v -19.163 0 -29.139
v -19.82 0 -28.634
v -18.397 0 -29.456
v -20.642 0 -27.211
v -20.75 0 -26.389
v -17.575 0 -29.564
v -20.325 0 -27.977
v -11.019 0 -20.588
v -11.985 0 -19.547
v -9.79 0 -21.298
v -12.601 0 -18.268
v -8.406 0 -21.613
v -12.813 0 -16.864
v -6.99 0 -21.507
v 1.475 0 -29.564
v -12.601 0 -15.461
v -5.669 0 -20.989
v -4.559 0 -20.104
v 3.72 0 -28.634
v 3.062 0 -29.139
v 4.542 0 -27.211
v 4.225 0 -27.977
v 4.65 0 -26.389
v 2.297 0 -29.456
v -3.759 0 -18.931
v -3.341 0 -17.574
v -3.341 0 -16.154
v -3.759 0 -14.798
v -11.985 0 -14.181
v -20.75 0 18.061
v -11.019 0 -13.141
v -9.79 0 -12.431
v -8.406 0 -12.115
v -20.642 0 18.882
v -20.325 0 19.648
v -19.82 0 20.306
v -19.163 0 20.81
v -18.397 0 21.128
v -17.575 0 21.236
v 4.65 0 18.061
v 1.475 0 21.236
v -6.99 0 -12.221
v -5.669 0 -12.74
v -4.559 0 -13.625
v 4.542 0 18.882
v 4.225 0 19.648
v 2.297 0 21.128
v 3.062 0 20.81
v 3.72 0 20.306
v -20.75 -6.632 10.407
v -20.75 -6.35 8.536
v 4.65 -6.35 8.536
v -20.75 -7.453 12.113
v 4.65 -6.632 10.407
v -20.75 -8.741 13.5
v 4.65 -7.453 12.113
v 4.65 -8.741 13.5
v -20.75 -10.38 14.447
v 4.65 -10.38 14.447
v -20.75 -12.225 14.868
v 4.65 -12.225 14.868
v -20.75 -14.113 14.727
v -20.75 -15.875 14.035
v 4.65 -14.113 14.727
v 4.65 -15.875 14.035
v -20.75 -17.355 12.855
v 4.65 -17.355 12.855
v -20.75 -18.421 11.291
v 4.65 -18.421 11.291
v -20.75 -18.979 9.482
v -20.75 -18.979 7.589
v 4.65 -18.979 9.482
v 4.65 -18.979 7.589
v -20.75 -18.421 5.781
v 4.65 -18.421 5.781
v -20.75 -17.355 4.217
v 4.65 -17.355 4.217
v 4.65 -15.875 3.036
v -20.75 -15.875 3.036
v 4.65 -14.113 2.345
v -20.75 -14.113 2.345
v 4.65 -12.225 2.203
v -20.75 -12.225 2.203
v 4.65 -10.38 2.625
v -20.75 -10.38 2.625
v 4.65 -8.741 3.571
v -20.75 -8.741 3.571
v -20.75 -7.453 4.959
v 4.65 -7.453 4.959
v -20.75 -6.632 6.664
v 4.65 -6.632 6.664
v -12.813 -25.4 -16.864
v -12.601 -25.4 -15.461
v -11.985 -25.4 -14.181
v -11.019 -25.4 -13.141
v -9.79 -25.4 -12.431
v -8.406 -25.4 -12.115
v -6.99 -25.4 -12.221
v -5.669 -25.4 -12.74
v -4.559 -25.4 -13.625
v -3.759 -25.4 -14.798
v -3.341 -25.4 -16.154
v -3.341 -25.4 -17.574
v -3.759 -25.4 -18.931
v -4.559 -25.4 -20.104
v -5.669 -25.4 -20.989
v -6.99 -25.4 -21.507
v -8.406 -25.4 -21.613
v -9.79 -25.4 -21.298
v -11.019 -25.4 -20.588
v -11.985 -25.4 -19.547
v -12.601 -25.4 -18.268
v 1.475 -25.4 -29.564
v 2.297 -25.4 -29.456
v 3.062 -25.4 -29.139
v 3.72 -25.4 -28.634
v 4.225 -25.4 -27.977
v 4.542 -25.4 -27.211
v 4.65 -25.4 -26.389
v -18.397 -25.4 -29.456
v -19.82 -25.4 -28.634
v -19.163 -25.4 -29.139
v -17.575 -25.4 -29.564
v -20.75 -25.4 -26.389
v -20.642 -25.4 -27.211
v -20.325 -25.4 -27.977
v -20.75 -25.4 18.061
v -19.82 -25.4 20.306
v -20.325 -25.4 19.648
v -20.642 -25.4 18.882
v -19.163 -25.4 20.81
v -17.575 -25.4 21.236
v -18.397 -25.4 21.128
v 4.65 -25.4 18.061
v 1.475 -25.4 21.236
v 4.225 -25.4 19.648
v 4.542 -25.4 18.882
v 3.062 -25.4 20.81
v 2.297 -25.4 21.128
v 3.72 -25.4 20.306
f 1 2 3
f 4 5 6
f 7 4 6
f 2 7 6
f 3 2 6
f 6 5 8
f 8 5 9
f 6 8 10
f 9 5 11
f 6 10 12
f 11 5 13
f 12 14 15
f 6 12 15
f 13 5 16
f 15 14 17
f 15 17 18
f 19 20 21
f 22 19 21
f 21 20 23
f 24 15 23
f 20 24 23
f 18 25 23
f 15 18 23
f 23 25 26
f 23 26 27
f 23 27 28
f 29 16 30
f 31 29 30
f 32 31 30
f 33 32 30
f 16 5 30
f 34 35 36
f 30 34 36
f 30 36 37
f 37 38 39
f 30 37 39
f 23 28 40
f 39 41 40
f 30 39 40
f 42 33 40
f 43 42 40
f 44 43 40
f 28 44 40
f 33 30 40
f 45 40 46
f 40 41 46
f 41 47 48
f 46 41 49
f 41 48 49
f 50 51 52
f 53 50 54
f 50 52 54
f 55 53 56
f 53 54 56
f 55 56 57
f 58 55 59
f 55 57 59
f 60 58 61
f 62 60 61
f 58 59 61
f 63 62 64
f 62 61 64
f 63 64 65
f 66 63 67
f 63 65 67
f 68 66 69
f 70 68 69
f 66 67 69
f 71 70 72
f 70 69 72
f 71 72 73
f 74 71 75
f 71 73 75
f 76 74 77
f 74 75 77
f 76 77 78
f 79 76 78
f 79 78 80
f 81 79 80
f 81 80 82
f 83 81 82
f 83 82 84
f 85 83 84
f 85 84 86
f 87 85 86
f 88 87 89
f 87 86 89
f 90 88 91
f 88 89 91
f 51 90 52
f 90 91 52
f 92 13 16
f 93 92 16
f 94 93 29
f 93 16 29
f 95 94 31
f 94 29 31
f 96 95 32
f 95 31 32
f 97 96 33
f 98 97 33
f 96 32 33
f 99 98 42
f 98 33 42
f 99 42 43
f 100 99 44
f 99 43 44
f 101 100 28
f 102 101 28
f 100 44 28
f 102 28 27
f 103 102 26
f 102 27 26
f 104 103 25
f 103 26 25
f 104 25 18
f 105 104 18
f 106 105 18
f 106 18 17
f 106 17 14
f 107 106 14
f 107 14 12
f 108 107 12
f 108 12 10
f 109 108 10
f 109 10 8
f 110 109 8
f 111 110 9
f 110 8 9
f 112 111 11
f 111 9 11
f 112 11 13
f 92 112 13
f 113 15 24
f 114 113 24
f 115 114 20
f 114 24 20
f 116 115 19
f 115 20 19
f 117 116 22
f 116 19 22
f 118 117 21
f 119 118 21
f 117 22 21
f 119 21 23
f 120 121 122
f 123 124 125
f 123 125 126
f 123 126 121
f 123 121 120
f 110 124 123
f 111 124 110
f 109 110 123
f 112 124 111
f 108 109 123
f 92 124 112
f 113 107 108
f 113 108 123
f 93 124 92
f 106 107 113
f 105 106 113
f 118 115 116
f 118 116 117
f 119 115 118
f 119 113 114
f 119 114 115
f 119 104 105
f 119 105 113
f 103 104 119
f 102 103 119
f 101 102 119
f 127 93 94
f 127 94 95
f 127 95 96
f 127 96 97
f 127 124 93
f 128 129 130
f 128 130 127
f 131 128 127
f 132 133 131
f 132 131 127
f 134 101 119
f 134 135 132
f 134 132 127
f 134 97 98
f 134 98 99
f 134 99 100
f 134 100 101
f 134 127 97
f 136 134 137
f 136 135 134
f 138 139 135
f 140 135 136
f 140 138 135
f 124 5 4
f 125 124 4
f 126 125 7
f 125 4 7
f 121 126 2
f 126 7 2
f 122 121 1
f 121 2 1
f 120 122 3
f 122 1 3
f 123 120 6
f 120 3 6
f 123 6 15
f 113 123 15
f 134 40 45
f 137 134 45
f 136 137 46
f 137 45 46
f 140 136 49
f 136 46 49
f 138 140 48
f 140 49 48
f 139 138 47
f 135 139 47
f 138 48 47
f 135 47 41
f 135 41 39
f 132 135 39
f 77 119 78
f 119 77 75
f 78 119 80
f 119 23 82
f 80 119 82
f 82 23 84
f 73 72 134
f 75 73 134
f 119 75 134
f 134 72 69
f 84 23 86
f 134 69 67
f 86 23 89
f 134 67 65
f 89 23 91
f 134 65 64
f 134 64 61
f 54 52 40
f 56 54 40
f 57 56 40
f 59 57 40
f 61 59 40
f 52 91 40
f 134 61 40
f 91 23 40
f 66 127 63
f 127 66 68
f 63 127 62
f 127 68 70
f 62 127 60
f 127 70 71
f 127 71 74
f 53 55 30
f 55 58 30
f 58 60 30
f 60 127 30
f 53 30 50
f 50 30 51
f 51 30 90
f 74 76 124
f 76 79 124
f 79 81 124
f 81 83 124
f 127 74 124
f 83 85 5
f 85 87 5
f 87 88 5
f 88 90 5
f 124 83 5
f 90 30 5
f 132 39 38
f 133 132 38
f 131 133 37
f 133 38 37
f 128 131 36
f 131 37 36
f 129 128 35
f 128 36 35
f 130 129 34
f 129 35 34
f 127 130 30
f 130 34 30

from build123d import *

# Parameters (mm, degrees)
F1_DEPTH = 25.4
F2_R     = 6.35
F3_DEPTH = 25.4
F4_R     = 4.7625
F5_DEPTH = 25.4


with BuildPart() as f1:
    # F0 (on Front) → F1 (new body)
    with BuildSketch(Plane.XZ):
        with BuildLine():
            ThreePointArc((-20.750085, -26.389282), (-19.820149, -28.634346), (-17.575085, -29.564282))
            Line((-17.575085, -29.564282), (1.474915, -29.564282))
            ThreePointArc((1.474915, -29.564282), (3.719979, -28.634346), (4.649915, -26.389282))
            Line((4.649915, -26.389282), (4.649915, 18.060718))
            ThreePointArc((4.649915, 18.060718), (3.719979, 20.305782), (1.474915, 21.235718))
            Line((1.474915, 21.235718), (-17.575085, 21.235718))
            ThreePointArc((-17.575085, 21.235718), (-19.820149, 20.305782), (-20.750085, 18.060718))
            Line((-20.750085, 18.060718), (-20.750085, -26.389282))
        make_face()
    extrude(amount=F1_DEPTH)

    # F2 (on face) → F3 (cut)
    with BuildSketch(Plane.YZ.offset(4.649915)):
        with Locations((-12.7, 8.535718)):
            Circle(F2_R)
    extrude(amount=-F3_DEPTH, mode=Mode.SUBTRACT)

    # F4 (on face) → F5 (cut)
    with BuildSketch(Plane(origin=(0, 0, 0), x_dir=(-1, 0, 0), z_dir=(0, 1, 0))):
        with Locations((8.050085, -16.864282)):
            Circle(F4_R)
    extrude(amount=-F5_DEPTH, mode=Mode.SUBTRACT)


solid = f1.part
